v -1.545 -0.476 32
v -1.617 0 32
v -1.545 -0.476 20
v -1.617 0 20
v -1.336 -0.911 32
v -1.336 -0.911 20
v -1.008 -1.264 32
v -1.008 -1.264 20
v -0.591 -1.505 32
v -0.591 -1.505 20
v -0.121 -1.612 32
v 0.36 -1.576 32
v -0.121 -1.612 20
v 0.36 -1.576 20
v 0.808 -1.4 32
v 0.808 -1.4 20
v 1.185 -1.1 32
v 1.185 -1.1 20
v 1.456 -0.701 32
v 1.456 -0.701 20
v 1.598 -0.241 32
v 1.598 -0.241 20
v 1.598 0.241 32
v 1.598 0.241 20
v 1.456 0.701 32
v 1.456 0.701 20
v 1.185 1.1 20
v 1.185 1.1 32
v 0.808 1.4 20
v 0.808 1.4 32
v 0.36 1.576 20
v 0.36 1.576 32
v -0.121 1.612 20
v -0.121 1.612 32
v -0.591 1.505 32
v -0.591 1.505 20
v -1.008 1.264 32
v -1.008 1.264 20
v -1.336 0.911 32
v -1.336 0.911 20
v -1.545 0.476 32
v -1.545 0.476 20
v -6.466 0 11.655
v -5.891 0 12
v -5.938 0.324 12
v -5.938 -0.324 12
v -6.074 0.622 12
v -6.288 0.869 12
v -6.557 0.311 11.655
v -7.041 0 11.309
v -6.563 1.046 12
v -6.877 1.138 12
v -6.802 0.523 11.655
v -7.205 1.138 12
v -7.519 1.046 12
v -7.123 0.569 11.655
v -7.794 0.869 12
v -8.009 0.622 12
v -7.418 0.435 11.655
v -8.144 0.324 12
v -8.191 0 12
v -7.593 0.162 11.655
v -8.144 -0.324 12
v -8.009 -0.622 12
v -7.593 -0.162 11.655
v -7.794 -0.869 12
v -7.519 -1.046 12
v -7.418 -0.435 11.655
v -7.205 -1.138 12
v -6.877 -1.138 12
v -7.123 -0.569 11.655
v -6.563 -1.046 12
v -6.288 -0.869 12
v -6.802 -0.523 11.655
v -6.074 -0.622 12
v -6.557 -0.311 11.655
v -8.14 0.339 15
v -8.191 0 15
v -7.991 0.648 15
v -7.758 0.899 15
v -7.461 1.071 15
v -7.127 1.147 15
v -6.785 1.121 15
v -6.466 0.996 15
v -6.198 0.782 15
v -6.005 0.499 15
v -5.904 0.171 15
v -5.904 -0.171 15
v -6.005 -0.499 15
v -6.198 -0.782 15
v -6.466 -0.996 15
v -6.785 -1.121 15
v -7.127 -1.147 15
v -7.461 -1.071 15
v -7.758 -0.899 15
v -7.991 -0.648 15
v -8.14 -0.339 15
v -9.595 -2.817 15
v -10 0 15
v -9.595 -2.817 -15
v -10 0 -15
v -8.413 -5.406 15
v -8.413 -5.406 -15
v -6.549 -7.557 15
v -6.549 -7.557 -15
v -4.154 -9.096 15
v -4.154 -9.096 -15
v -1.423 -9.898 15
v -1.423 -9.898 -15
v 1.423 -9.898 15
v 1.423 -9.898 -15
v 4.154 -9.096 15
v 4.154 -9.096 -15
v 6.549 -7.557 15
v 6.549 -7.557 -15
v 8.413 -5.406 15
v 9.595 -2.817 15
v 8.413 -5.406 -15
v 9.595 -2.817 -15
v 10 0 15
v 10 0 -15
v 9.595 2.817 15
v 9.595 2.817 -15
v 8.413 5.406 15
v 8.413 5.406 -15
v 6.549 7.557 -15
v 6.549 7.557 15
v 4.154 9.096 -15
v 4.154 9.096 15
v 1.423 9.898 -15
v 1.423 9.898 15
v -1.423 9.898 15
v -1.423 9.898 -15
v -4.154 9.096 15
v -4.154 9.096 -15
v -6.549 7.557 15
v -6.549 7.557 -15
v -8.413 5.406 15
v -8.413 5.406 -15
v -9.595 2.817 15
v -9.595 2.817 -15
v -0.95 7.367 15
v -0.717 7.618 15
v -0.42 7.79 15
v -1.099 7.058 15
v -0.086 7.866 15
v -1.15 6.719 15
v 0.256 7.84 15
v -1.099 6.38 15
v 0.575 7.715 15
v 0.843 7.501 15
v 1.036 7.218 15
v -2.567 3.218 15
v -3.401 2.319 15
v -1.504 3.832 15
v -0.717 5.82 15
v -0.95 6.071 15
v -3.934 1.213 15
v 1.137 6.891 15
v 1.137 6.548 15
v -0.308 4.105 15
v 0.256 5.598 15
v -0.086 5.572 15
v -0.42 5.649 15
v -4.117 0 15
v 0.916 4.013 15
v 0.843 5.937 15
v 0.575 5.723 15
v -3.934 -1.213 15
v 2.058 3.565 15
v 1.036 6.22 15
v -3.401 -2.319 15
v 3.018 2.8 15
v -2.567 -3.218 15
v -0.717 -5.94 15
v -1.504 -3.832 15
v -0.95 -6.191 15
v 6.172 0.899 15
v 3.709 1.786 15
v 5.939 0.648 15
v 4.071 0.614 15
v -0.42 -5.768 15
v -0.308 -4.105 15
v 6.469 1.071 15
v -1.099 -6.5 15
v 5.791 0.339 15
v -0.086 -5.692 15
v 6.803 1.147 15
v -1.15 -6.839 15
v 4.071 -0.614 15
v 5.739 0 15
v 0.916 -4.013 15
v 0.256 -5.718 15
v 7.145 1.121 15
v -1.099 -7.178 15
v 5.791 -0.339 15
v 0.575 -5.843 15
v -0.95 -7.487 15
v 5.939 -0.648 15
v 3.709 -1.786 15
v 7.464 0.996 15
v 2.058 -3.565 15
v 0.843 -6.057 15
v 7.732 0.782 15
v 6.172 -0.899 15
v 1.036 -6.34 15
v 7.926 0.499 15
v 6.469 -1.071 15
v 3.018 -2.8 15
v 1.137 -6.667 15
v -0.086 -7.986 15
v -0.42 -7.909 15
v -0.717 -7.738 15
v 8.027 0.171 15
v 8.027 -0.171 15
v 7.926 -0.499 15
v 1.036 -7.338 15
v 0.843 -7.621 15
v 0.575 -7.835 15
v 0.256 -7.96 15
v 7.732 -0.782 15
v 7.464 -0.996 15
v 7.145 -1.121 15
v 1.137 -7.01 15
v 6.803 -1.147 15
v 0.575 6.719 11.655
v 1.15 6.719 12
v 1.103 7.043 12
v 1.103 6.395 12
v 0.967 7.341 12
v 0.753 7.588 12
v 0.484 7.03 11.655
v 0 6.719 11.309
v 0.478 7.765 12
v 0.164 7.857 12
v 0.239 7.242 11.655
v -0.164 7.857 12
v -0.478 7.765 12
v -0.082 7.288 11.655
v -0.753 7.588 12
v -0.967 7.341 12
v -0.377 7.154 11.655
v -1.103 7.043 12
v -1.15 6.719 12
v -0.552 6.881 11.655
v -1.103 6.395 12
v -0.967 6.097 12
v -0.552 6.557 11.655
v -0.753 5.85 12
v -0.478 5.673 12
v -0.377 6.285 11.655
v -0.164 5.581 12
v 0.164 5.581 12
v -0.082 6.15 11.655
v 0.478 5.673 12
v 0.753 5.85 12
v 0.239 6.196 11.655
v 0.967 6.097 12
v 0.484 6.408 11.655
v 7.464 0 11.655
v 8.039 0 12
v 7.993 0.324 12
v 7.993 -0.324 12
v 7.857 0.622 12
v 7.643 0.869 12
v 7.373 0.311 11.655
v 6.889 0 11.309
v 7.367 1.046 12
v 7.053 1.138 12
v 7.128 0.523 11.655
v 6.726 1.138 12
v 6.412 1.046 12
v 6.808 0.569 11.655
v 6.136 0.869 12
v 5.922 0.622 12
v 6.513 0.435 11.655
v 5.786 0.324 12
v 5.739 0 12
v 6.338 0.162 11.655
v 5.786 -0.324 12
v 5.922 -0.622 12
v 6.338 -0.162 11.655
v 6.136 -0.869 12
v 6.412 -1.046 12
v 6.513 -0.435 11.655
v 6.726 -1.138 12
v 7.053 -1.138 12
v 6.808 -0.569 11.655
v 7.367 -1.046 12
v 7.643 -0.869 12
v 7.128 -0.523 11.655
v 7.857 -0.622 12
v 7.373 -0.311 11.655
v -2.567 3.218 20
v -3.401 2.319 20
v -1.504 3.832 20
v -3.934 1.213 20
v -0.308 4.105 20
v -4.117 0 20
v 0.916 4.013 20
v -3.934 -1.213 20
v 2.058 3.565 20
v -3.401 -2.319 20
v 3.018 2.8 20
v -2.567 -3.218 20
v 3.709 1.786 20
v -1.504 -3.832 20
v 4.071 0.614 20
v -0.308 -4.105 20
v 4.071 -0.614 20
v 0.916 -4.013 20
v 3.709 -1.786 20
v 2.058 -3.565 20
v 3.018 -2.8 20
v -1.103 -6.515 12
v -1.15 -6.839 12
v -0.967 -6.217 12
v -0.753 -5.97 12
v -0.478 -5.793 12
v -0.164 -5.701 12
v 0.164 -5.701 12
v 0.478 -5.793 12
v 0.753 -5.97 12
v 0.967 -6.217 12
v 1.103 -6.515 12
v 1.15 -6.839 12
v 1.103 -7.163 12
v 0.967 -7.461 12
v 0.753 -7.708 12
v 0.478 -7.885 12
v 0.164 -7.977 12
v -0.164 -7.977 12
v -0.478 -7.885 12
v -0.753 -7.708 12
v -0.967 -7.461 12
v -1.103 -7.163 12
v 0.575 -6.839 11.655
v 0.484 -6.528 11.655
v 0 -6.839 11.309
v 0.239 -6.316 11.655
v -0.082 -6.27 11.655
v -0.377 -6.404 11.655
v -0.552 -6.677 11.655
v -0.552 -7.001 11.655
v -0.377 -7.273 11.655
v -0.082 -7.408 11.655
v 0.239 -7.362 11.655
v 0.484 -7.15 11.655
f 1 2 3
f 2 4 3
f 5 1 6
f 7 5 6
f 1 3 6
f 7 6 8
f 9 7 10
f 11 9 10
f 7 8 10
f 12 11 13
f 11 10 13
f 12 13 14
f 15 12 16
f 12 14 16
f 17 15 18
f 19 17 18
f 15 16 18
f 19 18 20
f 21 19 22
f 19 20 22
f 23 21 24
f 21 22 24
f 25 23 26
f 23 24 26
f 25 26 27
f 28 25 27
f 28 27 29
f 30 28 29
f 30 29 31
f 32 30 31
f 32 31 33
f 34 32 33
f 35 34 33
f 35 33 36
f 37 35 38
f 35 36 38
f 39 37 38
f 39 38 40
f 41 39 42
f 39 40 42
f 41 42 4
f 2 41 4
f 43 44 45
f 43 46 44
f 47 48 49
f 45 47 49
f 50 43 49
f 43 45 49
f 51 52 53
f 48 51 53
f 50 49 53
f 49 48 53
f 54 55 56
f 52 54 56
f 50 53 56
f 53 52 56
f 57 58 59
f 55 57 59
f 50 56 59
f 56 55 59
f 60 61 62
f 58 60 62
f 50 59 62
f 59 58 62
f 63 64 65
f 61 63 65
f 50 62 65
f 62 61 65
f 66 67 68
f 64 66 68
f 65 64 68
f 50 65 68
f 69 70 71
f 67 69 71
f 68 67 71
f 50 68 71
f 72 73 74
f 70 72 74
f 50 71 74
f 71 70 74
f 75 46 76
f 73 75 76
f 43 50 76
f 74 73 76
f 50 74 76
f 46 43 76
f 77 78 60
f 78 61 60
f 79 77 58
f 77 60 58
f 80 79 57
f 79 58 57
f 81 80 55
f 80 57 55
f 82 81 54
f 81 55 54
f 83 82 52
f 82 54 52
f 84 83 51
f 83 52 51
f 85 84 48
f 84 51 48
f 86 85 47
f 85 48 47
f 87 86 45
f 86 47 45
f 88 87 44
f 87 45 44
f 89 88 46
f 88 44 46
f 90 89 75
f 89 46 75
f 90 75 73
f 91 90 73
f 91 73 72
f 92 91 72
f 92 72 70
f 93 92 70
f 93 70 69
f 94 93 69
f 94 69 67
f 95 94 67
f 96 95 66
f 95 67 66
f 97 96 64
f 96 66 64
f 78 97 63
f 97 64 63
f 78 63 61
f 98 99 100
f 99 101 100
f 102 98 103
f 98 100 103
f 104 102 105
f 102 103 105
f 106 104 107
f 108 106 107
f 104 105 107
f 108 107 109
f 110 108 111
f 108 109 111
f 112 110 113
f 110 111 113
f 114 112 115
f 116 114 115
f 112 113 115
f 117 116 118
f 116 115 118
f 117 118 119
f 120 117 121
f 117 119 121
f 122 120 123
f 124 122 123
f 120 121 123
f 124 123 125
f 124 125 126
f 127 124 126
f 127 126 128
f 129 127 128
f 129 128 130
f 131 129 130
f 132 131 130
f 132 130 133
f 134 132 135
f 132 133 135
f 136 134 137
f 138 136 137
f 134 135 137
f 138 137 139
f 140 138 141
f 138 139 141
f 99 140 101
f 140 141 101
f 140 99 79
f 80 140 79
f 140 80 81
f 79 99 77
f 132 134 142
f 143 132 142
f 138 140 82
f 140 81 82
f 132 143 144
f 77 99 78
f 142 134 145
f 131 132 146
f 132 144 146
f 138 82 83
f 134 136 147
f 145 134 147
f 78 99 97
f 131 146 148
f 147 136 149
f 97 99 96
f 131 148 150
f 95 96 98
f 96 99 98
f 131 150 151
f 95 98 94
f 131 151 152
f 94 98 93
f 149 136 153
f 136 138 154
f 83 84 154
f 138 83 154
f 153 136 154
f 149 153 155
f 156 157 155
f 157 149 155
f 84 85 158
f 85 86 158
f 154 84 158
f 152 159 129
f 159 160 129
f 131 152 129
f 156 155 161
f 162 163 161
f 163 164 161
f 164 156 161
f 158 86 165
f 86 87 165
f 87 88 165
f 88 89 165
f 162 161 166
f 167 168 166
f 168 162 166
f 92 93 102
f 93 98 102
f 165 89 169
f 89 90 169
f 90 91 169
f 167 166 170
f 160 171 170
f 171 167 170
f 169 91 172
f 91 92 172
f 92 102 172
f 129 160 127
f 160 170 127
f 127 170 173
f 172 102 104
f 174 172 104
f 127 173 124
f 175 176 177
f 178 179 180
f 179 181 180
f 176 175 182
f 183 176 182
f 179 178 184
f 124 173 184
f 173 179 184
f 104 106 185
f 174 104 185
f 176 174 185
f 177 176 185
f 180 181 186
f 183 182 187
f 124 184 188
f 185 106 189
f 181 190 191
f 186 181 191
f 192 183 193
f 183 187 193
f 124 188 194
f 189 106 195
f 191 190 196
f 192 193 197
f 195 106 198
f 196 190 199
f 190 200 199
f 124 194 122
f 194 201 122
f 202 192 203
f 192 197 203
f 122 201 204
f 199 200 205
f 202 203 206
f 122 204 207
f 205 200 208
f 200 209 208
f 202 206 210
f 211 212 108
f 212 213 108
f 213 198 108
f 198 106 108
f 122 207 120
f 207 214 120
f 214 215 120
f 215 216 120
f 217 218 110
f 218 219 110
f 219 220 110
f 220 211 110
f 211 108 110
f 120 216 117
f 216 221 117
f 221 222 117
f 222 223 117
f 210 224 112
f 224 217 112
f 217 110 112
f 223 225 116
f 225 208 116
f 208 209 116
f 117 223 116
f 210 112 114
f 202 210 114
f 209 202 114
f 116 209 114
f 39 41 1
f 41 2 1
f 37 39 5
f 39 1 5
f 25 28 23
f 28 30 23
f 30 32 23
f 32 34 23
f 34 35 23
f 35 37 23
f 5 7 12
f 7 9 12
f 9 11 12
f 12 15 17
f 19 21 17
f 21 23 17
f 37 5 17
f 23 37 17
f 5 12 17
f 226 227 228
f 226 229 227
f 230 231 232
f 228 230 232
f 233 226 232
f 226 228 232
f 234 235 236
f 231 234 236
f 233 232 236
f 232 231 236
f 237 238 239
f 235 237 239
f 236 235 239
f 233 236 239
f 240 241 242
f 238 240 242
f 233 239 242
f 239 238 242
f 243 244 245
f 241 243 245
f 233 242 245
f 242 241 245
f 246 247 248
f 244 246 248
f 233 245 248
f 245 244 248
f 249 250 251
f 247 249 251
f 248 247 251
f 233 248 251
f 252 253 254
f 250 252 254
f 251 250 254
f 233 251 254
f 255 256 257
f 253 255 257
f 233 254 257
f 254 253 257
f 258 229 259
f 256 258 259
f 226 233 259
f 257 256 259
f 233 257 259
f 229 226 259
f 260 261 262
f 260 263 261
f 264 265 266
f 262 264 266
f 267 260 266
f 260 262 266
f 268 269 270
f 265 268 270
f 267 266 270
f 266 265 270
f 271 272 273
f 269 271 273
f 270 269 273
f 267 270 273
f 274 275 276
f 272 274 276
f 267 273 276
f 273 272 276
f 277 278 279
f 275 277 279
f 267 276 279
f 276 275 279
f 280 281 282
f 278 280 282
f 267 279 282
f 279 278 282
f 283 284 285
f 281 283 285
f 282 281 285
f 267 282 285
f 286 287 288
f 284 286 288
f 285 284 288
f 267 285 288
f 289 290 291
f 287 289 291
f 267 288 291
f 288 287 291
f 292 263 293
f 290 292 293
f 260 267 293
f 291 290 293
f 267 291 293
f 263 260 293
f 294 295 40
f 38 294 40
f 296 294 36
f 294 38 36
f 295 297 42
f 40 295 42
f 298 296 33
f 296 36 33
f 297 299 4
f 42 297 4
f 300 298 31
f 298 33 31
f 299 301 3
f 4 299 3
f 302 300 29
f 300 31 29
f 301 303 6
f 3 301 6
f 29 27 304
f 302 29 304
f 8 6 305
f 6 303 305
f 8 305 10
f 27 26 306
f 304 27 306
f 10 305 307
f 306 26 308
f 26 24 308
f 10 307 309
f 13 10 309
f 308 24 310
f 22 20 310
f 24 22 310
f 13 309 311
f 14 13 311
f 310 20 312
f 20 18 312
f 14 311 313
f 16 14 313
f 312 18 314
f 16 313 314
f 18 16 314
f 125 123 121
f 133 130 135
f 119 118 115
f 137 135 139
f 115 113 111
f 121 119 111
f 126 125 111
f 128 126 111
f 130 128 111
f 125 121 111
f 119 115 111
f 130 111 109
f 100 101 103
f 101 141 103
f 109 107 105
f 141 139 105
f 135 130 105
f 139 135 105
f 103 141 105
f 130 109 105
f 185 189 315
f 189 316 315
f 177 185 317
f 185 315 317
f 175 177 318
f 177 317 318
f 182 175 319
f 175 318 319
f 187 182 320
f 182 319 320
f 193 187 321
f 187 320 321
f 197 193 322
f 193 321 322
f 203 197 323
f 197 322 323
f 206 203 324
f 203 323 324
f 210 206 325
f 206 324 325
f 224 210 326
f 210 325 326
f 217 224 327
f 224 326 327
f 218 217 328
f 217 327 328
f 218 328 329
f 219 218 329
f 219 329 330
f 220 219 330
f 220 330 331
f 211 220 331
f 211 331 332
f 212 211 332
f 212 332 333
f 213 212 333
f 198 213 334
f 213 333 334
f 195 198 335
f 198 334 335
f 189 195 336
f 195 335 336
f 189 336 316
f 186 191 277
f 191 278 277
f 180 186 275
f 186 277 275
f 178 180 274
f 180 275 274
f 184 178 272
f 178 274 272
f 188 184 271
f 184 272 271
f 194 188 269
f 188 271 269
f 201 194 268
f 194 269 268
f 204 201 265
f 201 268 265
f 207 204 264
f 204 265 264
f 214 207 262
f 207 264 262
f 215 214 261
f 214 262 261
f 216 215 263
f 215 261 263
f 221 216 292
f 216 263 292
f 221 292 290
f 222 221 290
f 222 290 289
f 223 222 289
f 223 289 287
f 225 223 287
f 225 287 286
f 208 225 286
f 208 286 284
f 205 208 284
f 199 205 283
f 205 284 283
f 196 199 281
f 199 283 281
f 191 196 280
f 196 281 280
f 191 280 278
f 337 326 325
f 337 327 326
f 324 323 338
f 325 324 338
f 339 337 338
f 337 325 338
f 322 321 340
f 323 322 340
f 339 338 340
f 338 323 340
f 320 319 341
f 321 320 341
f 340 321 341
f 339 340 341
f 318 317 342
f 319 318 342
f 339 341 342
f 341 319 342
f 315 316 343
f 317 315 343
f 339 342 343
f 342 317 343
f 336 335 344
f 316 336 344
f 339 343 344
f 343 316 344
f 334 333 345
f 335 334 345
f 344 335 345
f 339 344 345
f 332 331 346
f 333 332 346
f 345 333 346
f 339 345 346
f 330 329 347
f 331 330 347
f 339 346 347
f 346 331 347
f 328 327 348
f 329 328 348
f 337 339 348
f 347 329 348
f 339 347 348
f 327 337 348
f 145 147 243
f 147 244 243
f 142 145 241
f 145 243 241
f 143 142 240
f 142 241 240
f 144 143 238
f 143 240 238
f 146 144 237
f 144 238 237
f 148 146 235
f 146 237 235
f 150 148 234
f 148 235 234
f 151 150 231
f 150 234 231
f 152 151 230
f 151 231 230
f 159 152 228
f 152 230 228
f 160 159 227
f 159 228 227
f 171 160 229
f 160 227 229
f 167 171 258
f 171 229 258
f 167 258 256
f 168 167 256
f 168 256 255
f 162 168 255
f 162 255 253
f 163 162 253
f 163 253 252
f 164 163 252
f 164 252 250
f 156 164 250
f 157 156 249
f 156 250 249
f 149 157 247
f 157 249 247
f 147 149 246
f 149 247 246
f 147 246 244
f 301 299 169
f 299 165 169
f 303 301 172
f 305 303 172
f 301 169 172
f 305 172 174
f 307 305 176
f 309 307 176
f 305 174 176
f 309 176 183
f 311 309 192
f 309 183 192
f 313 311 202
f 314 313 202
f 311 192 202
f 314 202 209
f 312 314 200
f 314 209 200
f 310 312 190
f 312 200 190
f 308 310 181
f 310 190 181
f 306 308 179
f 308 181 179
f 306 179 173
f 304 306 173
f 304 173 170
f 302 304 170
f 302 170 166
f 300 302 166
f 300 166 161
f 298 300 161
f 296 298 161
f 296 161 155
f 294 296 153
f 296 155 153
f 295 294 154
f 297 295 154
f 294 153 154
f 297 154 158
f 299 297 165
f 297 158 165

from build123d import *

# Parameters (mm, degrees)
BROCA_DE_ROSQUEAR_PARA_HELICOIDE_M2_21_D     = 2.3
BROCA_DE_ROSQUEAR_PARA_HELICOIDE_M2_21_DEPTH = 3
BROCA_DE_ROSQUEAR_PARA_HELICOIDE_M2_21_TIP   = 0.690989712


with BuildPart() as part:
    # Esboço1 → Revolução1 (revolve)
    with BuildSketch(Plane(origin=(0, 0, 0), x_dir=(0, 0, -1), z_dir=(1, 0, 0)), mode=Mode.PRIVATE) as revolu_o1_sk:
        Polygon((-15, 10), (15, 10), (15, 0), (-32, 0), (-32, 1.616532902), (-20, 1.616532902), (-20, 4.116532902), (-15, 4.116532902), align=None)
    revolve(revolu_o1_sk.sketch.rotate(Axis((0, 0, -15), (0, 0, 1)), 90), axis=Axis((0, 0, -15), (0, 0, 1)))

    # Broca de rosquear para helicoide M2.21
    with Locations(Plane.XY.offset(15)):
        with Locations((0, 6.719156642), (6.889432955, 0), (0, -6.838865025), (-7.041061835, 0)):
            Hole(BROCA_DE_ROSQUEAR_PARA_HELICOIDE_M2_21_D / 2, depth=BROCA_DE_ROSQUEAR_PARA_HELICOIDE_M2_21_DEPTH)
            with Locations((0, 0, -(BROCA_DE_ROSQUEAR_PARA_HELICOIDE_M2_21_DEPTH + BROCA_DE_ROSQUEAR_PARA_HELICOIDE_M2_21_TIP / 2))):  # 118° drill point
                Cone(0, BROCA_DE_ROSQUEAR_PARA_HELICOIDE_M2_21_D / 2, BROCA_DE_ROSQUEAR_PARA_HELICOIDE_M2_21_TIP, mode=Mode.SUBTRACT)


solid = part.part
